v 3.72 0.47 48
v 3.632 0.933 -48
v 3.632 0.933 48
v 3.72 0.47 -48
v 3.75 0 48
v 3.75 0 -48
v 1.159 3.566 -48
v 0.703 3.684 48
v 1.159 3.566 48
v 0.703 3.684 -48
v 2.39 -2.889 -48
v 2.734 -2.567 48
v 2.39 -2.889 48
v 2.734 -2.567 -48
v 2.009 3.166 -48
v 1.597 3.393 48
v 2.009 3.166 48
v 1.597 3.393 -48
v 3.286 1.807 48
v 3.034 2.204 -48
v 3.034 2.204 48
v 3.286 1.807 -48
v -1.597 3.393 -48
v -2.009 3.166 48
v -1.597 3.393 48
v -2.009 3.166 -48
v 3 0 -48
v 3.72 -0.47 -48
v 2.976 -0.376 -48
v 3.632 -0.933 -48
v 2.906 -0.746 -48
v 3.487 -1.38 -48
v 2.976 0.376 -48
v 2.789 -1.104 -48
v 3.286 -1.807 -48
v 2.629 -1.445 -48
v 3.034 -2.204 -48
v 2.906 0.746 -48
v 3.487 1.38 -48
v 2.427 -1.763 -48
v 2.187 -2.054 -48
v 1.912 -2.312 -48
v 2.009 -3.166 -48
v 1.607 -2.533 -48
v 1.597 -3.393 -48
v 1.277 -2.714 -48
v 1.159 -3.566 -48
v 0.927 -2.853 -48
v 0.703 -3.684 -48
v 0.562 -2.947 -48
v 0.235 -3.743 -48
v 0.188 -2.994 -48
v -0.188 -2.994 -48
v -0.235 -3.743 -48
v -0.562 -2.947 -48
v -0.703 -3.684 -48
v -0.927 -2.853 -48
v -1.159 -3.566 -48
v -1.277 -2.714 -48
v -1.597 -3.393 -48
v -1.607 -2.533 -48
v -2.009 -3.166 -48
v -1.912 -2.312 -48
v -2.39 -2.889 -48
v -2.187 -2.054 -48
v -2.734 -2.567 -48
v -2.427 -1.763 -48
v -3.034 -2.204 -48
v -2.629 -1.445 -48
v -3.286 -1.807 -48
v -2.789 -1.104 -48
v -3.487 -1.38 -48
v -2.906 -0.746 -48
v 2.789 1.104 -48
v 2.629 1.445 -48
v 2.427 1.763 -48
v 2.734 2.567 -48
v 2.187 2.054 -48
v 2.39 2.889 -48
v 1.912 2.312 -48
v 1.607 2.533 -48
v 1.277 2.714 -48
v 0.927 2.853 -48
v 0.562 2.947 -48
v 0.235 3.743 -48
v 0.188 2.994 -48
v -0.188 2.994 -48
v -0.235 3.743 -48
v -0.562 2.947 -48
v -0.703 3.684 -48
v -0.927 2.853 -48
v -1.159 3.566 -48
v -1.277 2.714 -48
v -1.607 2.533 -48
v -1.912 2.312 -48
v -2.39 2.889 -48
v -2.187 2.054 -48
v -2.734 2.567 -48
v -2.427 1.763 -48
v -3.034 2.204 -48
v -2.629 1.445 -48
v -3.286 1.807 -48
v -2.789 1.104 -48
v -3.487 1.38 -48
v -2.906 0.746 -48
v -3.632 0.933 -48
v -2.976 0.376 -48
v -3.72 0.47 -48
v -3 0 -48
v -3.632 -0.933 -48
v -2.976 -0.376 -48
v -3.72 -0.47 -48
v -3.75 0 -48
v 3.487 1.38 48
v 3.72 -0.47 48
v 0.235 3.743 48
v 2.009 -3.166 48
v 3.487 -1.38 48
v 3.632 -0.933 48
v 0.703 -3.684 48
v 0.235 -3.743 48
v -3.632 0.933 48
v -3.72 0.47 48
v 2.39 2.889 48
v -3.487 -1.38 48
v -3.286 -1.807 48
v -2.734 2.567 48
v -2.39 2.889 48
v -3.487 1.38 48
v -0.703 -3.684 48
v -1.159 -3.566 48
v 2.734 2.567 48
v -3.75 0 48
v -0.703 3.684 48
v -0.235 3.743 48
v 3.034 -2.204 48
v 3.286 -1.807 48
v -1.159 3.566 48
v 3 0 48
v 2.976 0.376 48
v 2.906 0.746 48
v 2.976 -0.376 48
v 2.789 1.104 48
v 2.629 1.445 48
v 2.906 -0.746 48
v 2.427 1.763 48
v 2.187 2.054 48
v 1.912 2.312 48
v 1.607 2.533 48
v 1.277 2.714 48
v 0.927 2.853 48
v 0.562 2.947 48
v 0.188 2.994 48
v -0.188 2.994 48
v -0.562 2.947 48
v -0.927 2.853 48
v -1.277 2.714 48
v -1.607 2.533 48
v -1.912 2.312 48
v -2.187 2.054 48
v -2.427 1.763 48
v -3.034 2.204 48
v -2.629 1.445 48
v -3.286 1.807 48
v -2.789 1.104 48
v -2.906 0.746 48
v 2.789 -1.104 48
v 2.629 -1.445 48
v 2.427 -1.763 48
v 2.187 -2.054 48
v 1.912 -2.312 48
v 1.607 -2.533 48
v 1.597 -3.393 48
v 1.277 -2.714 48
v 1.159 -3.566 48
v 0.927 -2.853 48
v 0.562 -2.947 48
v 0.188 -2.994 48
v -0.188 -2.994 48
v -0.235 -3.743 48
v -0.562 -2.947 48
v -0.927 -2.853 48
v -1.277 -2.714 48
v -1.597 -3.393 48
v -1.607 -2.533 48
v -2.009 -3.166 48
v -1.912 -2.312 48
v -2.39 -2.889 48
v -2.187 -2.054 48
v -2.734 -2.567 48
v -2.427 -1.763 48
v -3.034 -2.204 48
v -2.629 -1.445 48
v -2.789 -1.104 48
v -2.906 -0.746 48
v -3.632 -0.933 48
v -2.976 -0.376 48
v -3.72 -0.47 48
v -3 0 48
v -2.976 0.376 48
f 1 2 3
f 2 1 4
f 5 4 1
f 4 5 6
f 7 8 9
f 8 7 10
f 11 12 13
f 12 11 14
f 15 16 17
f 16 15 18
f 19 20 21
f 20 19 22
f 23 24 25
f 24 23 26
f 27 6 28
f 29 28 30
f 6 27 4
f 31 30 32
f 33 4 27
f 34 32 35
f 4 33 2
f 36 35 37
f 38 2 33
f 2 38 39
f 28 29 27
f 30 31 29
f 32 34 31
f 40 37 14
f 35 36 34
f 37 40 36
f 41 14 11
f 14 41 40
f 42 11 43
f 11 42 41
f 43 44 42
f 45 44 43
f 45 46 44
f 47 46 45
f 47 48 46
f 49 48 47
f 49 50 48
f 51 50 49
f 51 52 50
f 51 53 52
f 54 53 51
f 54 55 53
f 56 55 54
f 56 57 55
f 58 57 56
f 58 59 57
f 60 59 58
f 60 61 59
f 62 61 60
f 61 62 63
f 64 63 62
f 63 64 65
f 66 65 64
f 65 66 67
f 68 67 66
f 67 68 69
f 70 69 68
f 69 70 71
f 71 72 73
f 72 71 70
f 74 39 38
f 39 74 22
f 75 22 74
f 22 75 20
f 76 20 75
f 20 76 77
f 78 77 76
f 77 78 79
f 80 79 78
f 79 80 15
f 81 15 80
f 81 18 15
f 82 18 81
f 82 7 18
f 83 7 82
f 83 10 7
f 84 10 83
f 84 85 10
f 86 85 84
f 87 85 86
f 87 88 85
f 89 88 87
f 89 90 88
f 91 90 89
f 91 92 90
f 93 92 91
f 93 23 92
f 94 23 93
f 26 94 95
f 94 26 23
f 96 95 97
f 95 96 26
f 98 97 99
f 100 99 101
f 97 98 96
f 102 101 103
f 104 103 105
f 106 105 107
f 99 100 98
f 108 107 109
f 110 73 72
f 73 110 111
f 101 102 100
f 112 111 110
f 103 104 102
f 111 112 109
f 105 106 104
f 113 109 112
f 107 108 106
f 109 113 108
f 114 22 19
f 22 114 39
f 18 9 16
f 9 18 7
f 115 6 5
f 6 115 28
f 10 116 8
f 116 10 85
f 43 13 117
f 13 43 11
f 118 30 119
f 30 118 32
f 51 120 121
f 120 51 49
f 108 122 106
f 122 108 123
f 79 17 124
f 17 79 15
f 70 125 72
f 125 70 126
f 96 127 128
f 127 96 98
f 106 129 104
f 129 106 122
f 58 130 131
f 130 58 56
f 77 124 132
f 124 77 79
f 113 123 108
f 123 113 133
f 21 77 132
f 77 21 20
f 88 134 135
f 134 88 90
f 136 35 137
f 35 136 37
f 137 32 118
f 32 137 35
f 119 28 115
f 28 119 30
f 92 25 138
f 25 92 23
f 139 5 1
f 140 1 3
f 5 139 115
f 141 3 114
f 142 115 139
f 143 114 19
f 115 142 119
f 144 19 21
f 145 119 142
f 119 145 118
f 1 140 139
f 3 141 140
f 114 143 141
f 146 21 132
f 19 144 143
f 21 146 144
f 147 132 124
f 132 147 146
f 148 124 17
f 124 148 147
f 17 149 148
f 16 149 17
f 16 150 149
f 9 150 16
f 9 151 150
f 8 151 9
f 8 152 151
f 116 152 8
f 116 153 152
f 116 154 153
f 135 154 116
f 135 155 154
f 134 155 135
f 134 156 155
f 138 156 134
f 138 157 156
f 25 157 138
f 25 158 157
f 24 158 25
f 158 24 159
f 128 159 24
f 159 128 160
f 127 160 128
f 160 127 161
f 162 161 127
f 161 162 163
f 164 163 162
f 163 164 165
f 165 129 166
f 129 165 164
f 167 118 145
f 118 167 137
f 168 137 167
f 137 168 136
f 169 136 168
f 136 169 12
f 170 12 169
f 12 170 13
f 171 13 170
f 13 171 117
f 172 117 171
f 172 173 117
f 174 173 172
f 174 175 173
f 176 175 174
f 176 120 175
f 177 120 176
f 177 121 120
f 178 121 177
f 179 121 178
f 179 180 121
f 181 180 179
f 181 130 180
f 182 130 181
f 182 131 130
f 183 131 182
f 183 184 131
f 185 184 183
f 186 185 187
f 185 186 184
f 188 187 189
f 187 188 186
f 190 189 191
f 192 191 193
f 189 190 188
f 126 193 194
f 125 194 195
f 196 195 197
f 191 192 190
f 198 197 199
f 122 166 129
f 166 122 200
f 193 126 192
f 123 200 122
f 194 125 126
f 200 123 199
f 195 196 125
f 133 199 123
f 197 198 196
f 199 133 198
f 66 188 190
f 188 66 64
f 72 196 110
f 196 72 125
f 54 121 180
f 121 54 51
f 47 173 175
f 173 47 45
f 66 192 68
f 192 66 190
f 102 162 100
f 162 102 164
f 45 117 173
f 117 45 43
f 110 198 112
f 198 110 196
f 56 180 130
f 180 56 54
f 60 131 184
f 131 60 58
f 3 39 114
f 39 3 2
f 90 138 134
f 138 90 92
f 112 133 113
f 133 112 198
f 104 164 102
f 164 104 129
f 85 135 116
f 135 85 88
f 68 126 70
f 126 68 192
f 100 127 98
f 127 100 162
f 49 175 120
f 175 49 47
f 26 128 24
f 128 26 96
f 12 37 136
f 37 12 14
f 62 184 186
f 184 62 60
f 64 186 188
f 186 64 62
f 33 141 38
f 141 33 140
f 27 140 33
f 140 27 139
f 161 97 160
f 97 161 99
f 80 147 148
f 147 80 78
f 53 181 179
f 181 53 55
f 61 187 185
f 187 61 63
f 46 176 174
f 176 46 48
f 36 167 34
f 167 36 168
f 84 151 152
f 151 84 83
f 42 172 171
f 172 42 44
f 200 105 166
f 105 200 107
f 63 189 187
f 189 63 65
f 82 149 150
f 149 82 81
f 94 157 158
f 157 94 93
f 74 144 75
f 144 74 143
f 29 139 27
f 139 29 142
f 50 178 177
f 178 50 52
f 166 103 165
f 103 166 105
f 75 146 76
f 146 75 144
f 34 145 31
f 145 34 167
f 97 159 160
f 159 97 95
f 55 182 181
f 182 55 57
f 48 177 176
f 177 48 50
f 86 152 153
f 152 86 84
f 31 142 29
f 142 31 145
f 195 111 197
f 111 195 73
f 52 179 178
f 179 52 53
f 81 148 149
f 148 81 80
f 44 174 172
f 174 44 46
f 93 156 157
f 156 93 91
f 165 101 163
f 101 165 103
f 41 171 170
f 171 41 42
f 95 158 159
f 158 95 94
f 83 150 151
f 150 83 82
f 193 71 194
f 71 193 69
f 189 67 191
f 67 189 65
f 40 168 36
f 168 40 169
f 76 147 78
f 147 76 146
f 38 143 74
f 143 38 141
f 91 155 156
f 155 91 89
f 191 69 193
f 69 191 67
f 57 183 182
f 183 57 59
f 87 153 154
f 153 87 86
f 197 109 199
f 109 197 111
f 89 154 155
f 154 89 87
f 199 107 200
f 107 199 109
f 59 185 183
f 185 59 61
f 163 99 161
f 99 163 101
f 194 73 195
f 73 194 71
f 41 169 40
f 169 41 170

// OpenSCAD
$fn = 50;


difference() {
	union() {
		translate(v = [0, 0, -48.0000000000]) {
			cylinder(h = 96, r = 3.7500000000);
		}
	}
	union() {
		translate(v = [0, 0, -100.0000000000]) {
			cylinder(h = 200, r = 3.0000000000);
		}
	}
}
